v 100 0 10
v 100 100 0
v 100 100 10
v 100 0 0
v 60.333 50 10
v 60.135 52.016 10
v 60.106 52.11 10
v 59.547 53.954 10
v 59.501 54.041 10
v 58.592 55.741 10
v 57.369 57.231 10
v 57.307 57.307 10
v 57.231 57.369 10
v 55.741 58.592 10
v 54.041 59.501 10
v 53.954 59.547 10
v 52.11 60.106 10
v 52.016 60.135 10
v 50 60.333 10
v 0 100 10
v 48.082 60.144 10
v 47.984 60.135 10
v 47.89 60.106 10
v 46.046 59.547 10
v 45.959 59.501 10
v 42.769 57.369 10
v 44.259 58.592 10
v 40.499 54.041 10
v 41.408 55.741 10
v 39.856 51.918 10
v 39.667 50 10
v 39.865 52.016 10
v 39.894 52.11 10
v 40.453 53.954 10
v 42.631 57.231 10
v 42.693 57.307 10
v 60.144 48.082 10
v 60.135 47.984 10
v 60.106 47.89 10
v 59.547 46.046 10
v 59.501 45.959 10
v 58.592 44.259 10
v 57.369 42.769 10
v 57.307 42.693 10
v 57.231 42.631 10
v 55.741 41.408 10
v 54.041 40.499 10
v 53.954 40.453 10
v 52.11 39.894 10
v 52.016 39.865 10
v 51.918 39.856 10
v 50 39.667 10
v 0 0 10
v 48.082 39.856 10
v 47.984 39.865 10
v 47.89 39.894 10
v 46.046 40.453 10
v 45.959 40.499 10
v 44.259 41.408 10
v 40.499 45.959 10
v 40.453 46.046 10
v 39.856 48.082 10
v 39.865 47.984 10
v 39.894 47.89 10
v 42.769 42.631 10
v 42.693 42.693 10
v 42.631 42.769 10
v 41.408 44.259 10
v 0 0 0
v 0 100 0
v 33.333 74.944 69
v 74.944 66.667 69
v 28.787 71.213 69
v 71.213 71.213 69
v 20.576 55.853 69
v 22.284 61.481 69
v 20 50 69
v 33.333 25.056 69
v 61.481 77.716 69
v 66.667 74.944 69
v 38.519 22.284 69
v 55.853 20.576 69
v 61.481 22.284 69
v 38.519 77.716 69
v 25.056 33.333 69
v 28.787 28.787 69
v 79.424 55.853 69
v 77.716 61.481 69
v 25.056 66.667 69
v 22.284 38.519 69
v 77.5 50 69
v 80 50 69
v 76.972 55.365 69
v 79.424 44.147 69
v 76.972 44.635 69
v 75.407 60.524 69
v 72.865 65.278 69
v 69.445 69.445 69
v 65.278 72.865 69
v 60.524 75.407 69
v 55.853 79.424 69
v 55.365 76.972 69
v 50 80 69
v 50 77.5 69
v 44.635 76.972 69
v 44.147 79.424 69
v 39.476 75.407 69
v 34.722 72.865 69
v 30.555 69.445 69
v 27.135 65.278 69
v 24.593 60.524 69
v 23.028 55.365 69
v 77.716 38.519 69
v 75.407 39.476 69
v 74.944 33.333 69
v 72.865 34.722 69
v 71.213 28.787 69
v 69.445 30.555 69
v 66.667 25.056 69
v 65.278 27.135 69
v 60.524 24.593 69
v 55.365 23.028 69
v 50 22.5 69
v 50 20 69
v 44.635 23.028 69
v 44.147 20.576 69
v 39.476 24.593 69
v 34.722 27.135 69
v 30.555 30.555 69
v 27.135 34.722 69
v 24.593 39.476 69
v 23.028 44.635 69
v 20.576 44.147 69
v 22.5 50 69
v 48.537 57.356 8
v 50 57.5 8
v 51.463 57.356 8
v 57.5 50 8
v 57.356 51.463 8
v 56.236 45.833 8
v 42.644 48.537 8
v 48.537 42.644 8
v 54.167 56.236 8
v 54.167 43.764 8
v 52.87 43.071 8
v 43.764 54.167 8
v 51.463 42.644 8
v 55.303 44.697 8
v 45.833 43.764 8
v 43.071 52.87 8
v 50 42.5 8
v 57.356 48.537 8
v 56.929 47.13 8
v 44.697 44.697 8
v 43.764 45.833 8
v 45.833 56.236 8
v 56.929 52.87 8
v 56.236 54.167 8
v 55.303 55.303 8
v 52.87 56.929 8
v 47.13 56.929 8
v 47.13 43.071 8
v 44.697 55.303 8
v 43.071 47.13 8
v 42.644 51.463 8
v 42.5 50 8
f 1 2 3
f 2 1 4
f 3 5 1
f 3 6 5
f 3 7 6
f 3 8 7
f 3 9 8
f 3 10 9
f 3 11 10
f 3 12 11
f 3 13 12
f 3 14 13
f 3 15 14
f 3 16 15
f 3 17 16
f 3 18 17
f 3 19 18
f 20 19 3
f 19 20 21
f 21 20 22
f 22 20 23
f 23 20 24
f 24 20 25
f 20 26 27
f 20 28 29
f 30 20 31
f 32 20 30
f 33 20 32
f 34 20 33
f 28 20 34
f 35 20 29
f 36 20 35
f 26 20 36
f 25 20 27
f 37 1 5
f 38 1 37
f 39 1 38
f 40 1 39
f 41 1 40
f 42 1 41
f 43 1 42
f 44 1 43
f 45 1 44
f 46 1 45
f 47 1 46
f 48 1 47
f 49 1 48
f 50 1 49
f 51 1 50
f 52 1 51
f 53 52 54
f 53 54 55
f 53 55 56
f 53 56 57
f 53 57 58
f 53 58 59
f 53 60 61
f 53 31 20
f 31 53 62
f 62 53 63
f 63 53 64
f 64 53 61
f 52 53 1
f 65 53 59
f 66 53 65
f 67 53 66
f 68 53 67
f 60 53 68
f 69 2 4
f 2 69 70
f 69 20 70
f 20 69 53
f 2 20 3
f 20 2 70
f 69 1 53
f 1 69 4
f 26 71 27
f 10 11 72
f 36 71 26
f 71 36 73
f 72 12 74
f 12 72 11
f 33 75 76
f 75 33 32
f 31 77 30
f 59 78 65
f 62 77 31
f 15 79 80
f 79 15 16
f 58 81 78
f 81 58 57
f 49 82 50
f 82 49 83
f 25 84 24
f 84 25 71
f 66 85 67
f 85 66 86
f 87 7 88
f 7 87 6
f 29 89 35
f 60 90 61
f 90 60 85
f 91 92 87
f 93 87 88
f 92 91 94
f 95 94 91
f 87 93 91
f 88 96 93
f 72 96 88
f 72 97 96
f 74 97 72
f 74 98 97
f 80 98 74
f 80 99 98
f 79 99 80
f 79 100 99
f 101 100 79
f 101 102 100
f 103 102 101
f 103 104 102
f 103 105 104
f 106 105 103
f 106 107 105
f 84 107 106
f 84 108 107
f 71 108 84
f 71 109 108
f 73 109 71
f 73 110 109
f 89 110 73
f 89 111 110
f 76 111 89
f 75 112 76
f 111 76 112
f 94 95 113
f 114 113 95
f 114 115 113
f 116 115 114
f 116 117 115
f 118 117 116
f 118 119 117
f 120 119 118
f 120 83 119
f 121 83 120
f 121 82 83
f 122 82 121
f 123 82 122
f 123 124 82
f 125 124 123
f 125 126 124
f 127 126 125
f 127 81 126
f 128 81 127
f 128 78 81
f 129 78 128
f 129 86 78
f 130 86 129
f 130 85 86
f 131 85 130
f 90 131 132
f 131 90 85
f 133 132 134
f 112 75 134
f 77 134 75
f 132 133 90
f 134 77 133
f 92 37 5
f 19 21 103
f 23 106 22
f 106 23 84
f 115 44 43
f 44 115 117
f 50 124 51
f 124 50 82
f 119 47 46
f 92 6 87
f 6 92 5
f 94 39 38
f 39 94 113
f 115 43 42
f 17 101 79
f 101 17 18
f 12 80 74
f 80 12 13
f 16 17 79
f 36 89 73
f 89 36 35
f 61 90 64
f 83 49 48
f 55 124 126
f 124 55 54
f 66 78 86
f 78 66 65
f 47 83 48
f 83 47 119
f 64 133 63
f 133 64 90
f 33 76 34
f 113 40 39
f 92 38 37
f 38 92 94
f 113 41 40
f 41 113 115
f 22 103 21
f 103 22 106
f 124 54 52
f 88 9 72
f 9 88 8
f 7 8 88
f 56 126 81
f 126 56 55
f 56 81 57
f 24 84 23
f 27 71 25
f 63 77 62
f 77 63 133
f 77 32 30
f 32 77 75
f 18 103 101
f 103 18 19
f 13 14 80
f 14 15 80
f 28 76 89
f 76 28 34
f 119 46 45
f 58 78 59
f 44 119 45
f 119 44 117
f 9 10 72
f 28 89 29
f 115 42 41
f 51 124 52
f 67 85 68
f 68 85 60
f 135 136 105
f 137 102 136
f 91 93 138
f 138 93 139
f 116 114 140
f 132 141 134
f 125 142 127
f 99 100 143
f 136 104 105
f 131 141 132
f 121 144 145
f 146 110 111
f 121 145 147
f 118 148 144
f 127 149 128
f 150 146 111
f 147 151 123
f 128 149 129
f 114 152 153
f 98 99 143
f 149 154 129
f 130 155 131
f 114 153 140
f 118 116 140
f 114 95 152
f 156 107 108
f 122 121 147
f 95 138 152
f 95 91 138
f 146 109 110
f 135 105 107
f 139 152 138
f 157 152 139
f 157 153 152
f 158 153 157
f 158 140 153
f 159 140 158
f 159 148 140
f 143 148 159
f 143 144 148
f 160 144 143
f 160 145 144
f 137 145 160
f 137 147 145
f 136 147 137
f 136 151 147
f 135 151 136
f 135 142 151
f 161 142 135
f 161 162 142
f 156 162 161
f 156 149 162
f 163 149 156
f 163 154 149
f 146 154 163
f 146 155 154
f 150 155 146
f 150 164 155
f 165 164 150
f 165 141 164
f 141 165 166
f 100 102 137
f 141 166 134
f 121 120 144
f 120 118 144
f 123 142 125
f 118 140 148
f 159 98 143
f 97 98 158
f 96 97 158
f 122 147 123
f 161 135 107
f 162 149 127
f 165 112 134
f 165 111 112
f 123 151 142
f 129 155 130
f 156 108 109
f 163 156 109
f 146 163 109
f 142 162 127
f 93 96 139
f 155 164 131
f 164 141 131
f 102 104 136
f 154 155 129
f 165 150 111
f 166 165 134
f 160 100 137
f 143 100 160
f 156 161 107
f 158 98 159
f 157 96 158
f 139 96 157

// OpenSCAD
$fn = 32;

// ----------------------------------------------------------------------
// Hopper: funnel with square flange
// ----------------------------------------------------------------------

// --- parameters (mm) ---
fl = 100;                 // flange side, X and Y
fl_t = 10;                // flange thickness
cone_h = 60;              // cone height above the flange
top_d = 60;               // cone mouth diameter
bot_d = 20;               // cone spout diameter
wall = 2.5;               // cone wall thickness

bore_d = bot_d - 2 * wall;  // spout bore diameter
total_h = fl_t + cone_h - 1;  // overall height

difference() {
  union() {
    cube([fl, fl, fl_t]);
    translate([fl / 2, fl / 2, fl_t - 1])
      cylinder(h = cone_h, d1 = bot_d, d2 = top_d);
  }
  translate([fl / 2, fl / 2, fl_t - 2])
    cylinder(h = cone_h + 1, d1 = bore_d, d2 = top_d - 2 * wall);
}
